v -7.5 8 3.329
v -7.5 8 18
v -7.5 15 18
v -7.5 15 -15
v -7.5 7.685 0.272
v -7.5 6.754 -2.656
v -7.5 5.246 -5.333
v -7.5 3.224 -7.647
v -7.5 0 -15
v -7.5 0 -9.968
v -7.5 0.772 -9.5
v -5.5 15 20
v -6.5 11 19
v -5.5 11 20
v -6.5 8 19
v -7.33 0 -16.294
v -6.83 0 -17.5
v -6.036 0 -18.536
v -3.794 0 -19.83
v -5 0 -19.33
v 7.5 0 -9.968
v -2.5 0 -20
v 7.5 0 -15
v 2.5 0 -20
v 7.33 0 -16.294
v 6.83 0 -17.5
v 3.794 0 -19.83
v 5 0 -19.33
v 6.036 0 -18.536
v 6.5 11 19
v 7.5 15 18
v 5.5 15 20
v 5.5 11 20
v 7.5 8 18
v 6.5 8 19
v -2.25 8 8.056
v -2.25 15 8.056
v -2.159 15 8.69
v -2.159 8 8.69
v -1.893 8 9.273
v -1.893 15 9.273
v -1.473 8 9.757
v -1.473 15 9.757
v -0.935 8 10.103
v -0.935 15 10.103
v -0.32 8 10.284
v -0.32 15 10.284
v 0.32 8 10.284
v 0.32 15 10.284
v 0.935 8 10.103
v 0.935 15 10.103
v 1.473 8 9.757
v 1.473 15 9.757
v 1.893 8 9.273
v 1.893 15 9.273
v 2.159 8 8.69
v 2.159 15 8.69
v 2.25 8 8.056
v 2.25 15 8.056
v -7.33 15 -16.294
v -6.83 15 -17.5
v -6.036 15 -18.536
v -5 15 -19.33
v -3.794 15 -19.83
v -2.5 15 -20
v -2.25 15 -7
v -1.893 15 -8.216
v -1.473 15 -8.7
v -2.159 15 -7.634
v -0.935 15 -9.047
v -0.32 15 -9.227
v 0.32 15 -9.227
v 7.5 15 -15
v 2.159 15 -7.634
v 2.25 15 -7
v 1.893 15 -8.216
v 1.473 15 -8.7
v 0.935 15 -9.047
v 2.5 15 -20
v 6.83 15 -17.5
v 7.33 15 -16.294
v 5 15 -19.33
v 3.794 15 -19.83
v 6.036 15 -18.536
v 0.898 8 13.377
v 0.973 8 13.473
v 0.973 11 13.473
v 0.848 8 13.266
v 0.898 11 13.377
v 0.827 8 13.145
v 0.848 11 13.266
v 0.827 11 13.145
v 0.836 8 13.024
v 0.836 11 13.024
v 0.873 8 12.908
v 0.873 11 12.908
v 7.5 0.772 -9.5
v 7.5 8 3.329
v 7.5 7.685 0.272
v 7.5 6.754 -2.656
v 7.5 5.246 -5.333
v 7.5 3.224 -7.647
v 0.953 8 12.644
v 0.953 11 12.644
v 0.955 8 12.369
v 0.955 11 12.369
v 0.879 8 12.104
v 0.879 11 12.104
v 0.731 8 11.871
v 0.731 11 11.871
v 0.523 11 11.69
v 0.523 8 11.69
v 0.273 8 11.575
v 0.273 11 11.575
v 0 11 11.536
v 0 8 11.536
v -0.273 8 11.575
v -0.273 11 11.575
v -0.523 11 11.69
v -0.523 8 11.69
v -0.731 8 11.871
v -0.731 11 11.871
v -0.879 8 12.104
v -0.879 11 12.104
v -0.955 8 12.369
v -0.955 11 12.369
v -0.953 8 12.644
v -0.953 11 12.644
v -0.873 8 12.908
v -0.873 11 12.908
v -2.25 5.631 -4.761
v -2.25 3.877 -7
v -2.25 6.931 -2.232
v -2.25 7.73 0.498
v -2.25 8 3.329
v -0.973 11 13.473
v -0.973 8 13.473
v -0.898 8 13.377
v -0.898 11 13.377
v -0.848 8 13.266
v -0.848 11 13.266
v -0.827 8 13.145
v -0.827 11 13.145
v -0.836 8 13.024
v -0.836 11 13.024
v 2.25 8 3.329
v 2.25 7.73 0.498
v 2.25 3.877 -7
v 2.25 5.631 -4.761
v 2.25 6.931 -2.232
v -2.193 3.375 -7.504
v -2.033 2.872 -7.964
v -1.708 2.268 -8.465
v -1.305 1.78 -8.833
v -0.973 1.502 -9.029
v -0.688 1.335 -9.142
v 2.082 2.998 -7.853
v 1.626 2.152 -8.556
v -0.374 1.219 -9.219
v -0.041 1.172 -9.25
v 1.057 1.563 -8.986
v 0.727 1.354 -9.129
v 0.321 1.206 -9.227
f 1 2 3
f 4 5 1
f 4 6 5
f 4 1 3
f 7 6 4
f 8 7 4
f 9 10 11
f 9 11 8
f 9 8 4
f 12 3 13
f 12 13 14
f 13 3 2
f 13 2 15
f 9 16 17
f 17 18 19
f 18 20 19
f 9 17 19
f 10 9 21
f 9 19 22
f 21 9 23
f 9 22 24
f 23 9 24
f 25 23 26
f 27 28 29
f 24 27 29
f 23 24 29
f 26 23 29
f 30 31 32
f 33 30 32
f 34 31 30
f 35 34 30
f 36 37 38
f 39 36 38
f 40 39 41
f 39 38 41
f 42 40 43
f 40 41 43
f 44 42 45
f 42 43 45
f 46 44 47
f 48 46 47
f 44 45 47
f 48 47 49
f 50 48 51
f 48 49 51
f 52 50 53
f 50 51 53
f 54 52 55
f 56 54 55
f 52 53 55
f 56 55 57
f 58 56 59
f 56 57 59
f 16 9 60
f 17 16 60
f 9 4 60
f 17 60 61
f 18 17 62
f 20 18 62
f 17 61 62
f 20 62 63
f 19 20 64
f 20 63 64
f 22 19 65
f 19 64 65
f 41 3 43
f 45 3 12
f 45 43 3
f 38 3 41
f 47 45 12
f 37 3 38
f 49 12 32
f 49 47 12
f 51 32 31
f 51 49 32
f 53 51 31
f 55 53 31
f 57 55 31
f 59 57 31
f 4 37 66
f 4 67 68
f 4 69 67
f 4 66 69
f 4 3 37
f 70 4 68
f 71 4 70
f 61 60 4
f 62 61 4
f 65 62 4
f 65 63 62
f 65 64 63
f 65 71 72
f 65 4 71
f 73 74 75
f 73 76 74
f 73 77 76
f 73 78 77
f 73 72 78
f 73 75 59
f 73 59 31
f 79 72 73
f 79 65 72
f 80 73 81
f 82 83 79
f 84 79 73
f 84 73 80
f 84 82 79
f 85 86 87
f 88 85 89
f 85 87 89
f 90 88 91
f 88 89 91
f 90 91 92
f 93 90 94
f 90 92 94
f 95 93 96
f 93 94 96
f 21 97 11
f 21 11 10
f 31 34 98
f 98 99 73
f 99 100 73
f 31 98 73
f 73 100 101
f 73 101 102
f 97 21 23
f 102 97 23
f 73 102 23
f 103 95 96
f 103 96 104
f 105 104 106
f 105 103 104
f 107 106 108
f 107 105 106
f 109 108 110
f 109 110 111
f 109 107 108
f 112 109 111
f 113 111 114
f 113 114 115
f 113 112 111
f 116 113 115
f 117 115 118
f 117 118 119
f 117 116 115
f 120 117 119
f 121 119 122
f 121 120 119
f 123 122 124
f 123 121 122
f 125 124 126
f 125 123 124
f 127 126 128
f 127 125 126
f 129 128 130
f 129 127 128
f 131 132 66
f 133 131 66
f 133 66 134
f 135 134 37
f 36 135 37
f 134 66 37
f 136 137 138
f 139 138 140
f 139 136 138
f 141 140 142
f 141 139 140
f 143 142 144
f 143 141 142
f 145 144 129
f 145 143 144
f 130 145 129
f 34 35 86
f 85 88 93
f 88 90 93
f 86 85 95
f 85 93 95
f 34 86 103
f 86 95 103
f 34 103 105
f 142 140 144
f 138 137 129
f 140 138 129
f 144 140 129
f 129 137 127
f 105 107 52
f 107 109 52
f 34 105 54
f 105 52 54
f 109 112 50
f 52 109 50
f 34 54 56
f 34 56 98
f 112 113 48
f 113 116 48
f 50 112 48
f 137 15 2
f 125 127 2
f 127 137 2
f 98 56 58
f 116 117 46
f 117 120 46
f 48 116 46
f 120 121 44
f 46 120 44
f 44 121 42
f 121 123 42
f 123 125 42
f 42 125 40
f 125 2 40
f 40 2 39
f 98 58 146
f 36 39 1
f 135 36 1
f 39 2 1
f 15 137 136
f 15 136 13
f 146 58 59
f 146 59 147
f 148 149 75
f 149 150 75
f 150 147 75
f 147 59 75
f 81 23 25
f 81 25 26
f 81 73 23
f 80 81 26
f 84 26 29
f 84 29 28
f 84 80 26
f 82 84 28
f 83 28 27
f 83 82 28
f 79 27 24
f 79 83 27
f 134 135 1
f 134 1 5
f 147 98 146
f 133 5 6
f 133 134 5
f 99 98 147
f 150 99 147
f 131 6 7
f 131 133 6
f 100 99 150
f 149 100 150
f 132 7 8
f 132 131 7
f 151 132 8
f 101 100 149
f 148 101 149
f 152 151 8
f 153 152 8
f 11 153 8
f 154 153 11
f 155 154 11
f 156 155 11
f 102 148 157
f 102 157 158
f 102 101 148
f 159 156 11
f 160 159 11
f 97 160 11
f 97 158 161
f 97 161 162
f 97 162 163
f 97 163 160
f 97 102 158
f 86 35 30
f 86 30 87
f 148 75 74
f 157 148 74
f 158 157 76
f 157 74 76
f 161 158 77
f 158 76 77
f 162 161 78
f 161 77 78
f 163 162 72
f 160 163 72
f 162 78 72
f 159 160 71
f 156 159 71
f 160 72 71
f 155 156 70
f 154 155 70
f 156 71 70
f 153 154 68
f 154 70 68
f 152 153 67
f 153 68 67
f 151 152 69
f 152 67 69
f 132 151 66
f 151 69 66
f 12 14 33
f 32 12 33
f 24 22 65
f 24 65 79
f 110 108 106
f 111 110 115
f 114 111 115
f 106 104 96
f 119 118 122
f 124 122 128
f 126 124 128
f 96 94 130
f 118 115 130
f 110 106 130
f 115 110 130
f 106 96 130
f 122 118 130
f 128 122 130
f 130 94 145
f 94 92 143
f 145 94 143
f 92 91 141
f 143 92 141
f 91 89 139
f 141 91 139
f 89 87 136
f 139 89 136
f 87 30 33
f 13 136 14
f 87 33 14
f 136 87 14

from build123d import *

# Parameters (mm, degrees)
SKETCH1_W           = 15
SKETCH1_H           = 40
BOSS_EXTRUDE1_DEPTH = 15
CUT_EXTRUDE1_DEPTH  = 30.154759474
FILLET1_R           = 15
CUT_EXTRUDE2_DEPTH  = 3
FILLET2_R           = 0.5
FILLET4_R           = 0.5
CHAMFER1_SIZE       = 2
FILLET6_R           = 5
CUT_EXTRUDE3_DEPTH  = 27.100766272


with BuildPart() as part:
    # Sketch1 → Boss-Extrude1 (new body)
    with BuildSketch(Plane(origin=(0, 0, 0), x_dir=(1, 0, 0), z_dir=(0, 1, 0))):
        Rectangle(SKETCH1_W, SKETCH1_H)
    extrude(amount=BOSS_EXTRUDE1_DEPTH)

    # Sketch3 → Cut-Extrude1 (cut, through all)
    with BuildSketch(Plane.ZY.offset(7.5)):
        Polygon((20, 0), (20, 8), (-5.121506718, 8), (-9.96820088, 0), align=None)
    extrude(amount=-CUT_EXTRUDE1_DEPTH, mode=Mode.SUBTRACT)

    # Fillet1
    fillet1_edges = [part.edges().sort_by_distance(p)[0] for p in [
        (0, 8, -5.121506718),
    ]]
    fillet(fillet1_edges, radius=FILLET1_R)

    # Sketch5 → Cut-Extrude2 (cut)
    with BuildSketch(Plane.XZ.offset(-8)):
        with BuildLine():
            Line((7.5, 20), (0.681678783, 13.181678783))
            ThreePointArc((0.681678783, 13.181678783), (0, 11.53596062), (-0.681678783, 13.181678783))
            Line((-0.681678783, 13.181678783), (-7.5, 20))
            Line((-7.5, 20), (7.5, 20))
        make_face()
    extrude(amount=-CUT_EXTRUDE2_DEPTH, mode=Mode.SUBTRACT)

    # Fillet2
    fillet2_edges = [part.edges().sort_by_distance(p)[0] for p in [
        (0.681678783, 9.5, 13.181678783),
        (-0.681678783, 9.5, 13.181678783),
    ]]
    fillet(fillet2_edges, radius=FILLET2_R)

    # Fillet4
    fillet4_edges = [part.edges().sort_by_distance(p)[0] for p in [
        (-7.5, 9.5, 20),
        (7.5, 9.5, 20),
    ]]
    fillet(fillet4_edges, radius=FILLET4_R)

    # Chamfer1
    # the kernel refuses this chamfer: 2 mm, written as the material it takes off along each edge
    with BuildSketch(Plane(origin=(7.5, 5.856634024, 20), x_dir=(0.02749587661058651, 0, -0.9996219169112968), z_dir=(0, 1, 0))) as chamfer1_piece_1:
        Polygon((CHAMFER1_SIZE * 0.999621916911, CHAMFER1_SIZE * 0.0274958766106), (-CHAMFER1_SIZE * 0.0274958766106, CHAMFER1_SIZE * 0.999621916911), (0, 0), align=None)
    extrude(amount=14.286731952, mode=Mode.SUBTRACT)
    with BuildSketch(Plane(origin=(-7.5, 5.856634024, 20), x_dir=(-0.02749587661058651, 0, -0.9996219169112968), z_dir=(0, 1, 0))) as chamfer1_piece_2:
        Polygon((CHAMFER1_SIZE * 0.999621916911, -CHAMFER1_SIZE * 0.0274958766106), (-CHAMFER1_SIZE * 0.0274958766106, -CHAMFER1_SIZE * 0.999621916911), (0, 0), align=None)
    extrude(amount=14.286731952, mode=Mode.SUBTRACT)

    # Fillet6
    fillet6_edges = [part.edges().sort_by_distance(p)[0] for p in [
        (-7.5, 7.5, -20),
        (7.5, 7.5, -20),
    ]]
    fillet(fillet6_edges, radius=FILLET6_R)

    # Sketch6 → Cut-Extrude3 (cut, through all)
    with BuildSketch(Plane(origin=(0, 15, 0), x_dir=(1, 0, 0), z_dir=(0, 1, 0))):
        with BuildLine():
            Line((-2.25, 7), (-2.25, -8.056468678))
            ThreePointArc((-2.25, -8.056468678), (0, -10.306468678), (2.25, -8.056468678))
            Line((2.25, -8.056468678), (2.25, 7))
            ThreePointArc((2.25, 7), (0, 9.25), (-2.25, 7))
        make_face()
    extrude(amount=-CUT_EXTRUDE3_DEPTH, mode=Mode.SUBTRACT)


solid = part.part
